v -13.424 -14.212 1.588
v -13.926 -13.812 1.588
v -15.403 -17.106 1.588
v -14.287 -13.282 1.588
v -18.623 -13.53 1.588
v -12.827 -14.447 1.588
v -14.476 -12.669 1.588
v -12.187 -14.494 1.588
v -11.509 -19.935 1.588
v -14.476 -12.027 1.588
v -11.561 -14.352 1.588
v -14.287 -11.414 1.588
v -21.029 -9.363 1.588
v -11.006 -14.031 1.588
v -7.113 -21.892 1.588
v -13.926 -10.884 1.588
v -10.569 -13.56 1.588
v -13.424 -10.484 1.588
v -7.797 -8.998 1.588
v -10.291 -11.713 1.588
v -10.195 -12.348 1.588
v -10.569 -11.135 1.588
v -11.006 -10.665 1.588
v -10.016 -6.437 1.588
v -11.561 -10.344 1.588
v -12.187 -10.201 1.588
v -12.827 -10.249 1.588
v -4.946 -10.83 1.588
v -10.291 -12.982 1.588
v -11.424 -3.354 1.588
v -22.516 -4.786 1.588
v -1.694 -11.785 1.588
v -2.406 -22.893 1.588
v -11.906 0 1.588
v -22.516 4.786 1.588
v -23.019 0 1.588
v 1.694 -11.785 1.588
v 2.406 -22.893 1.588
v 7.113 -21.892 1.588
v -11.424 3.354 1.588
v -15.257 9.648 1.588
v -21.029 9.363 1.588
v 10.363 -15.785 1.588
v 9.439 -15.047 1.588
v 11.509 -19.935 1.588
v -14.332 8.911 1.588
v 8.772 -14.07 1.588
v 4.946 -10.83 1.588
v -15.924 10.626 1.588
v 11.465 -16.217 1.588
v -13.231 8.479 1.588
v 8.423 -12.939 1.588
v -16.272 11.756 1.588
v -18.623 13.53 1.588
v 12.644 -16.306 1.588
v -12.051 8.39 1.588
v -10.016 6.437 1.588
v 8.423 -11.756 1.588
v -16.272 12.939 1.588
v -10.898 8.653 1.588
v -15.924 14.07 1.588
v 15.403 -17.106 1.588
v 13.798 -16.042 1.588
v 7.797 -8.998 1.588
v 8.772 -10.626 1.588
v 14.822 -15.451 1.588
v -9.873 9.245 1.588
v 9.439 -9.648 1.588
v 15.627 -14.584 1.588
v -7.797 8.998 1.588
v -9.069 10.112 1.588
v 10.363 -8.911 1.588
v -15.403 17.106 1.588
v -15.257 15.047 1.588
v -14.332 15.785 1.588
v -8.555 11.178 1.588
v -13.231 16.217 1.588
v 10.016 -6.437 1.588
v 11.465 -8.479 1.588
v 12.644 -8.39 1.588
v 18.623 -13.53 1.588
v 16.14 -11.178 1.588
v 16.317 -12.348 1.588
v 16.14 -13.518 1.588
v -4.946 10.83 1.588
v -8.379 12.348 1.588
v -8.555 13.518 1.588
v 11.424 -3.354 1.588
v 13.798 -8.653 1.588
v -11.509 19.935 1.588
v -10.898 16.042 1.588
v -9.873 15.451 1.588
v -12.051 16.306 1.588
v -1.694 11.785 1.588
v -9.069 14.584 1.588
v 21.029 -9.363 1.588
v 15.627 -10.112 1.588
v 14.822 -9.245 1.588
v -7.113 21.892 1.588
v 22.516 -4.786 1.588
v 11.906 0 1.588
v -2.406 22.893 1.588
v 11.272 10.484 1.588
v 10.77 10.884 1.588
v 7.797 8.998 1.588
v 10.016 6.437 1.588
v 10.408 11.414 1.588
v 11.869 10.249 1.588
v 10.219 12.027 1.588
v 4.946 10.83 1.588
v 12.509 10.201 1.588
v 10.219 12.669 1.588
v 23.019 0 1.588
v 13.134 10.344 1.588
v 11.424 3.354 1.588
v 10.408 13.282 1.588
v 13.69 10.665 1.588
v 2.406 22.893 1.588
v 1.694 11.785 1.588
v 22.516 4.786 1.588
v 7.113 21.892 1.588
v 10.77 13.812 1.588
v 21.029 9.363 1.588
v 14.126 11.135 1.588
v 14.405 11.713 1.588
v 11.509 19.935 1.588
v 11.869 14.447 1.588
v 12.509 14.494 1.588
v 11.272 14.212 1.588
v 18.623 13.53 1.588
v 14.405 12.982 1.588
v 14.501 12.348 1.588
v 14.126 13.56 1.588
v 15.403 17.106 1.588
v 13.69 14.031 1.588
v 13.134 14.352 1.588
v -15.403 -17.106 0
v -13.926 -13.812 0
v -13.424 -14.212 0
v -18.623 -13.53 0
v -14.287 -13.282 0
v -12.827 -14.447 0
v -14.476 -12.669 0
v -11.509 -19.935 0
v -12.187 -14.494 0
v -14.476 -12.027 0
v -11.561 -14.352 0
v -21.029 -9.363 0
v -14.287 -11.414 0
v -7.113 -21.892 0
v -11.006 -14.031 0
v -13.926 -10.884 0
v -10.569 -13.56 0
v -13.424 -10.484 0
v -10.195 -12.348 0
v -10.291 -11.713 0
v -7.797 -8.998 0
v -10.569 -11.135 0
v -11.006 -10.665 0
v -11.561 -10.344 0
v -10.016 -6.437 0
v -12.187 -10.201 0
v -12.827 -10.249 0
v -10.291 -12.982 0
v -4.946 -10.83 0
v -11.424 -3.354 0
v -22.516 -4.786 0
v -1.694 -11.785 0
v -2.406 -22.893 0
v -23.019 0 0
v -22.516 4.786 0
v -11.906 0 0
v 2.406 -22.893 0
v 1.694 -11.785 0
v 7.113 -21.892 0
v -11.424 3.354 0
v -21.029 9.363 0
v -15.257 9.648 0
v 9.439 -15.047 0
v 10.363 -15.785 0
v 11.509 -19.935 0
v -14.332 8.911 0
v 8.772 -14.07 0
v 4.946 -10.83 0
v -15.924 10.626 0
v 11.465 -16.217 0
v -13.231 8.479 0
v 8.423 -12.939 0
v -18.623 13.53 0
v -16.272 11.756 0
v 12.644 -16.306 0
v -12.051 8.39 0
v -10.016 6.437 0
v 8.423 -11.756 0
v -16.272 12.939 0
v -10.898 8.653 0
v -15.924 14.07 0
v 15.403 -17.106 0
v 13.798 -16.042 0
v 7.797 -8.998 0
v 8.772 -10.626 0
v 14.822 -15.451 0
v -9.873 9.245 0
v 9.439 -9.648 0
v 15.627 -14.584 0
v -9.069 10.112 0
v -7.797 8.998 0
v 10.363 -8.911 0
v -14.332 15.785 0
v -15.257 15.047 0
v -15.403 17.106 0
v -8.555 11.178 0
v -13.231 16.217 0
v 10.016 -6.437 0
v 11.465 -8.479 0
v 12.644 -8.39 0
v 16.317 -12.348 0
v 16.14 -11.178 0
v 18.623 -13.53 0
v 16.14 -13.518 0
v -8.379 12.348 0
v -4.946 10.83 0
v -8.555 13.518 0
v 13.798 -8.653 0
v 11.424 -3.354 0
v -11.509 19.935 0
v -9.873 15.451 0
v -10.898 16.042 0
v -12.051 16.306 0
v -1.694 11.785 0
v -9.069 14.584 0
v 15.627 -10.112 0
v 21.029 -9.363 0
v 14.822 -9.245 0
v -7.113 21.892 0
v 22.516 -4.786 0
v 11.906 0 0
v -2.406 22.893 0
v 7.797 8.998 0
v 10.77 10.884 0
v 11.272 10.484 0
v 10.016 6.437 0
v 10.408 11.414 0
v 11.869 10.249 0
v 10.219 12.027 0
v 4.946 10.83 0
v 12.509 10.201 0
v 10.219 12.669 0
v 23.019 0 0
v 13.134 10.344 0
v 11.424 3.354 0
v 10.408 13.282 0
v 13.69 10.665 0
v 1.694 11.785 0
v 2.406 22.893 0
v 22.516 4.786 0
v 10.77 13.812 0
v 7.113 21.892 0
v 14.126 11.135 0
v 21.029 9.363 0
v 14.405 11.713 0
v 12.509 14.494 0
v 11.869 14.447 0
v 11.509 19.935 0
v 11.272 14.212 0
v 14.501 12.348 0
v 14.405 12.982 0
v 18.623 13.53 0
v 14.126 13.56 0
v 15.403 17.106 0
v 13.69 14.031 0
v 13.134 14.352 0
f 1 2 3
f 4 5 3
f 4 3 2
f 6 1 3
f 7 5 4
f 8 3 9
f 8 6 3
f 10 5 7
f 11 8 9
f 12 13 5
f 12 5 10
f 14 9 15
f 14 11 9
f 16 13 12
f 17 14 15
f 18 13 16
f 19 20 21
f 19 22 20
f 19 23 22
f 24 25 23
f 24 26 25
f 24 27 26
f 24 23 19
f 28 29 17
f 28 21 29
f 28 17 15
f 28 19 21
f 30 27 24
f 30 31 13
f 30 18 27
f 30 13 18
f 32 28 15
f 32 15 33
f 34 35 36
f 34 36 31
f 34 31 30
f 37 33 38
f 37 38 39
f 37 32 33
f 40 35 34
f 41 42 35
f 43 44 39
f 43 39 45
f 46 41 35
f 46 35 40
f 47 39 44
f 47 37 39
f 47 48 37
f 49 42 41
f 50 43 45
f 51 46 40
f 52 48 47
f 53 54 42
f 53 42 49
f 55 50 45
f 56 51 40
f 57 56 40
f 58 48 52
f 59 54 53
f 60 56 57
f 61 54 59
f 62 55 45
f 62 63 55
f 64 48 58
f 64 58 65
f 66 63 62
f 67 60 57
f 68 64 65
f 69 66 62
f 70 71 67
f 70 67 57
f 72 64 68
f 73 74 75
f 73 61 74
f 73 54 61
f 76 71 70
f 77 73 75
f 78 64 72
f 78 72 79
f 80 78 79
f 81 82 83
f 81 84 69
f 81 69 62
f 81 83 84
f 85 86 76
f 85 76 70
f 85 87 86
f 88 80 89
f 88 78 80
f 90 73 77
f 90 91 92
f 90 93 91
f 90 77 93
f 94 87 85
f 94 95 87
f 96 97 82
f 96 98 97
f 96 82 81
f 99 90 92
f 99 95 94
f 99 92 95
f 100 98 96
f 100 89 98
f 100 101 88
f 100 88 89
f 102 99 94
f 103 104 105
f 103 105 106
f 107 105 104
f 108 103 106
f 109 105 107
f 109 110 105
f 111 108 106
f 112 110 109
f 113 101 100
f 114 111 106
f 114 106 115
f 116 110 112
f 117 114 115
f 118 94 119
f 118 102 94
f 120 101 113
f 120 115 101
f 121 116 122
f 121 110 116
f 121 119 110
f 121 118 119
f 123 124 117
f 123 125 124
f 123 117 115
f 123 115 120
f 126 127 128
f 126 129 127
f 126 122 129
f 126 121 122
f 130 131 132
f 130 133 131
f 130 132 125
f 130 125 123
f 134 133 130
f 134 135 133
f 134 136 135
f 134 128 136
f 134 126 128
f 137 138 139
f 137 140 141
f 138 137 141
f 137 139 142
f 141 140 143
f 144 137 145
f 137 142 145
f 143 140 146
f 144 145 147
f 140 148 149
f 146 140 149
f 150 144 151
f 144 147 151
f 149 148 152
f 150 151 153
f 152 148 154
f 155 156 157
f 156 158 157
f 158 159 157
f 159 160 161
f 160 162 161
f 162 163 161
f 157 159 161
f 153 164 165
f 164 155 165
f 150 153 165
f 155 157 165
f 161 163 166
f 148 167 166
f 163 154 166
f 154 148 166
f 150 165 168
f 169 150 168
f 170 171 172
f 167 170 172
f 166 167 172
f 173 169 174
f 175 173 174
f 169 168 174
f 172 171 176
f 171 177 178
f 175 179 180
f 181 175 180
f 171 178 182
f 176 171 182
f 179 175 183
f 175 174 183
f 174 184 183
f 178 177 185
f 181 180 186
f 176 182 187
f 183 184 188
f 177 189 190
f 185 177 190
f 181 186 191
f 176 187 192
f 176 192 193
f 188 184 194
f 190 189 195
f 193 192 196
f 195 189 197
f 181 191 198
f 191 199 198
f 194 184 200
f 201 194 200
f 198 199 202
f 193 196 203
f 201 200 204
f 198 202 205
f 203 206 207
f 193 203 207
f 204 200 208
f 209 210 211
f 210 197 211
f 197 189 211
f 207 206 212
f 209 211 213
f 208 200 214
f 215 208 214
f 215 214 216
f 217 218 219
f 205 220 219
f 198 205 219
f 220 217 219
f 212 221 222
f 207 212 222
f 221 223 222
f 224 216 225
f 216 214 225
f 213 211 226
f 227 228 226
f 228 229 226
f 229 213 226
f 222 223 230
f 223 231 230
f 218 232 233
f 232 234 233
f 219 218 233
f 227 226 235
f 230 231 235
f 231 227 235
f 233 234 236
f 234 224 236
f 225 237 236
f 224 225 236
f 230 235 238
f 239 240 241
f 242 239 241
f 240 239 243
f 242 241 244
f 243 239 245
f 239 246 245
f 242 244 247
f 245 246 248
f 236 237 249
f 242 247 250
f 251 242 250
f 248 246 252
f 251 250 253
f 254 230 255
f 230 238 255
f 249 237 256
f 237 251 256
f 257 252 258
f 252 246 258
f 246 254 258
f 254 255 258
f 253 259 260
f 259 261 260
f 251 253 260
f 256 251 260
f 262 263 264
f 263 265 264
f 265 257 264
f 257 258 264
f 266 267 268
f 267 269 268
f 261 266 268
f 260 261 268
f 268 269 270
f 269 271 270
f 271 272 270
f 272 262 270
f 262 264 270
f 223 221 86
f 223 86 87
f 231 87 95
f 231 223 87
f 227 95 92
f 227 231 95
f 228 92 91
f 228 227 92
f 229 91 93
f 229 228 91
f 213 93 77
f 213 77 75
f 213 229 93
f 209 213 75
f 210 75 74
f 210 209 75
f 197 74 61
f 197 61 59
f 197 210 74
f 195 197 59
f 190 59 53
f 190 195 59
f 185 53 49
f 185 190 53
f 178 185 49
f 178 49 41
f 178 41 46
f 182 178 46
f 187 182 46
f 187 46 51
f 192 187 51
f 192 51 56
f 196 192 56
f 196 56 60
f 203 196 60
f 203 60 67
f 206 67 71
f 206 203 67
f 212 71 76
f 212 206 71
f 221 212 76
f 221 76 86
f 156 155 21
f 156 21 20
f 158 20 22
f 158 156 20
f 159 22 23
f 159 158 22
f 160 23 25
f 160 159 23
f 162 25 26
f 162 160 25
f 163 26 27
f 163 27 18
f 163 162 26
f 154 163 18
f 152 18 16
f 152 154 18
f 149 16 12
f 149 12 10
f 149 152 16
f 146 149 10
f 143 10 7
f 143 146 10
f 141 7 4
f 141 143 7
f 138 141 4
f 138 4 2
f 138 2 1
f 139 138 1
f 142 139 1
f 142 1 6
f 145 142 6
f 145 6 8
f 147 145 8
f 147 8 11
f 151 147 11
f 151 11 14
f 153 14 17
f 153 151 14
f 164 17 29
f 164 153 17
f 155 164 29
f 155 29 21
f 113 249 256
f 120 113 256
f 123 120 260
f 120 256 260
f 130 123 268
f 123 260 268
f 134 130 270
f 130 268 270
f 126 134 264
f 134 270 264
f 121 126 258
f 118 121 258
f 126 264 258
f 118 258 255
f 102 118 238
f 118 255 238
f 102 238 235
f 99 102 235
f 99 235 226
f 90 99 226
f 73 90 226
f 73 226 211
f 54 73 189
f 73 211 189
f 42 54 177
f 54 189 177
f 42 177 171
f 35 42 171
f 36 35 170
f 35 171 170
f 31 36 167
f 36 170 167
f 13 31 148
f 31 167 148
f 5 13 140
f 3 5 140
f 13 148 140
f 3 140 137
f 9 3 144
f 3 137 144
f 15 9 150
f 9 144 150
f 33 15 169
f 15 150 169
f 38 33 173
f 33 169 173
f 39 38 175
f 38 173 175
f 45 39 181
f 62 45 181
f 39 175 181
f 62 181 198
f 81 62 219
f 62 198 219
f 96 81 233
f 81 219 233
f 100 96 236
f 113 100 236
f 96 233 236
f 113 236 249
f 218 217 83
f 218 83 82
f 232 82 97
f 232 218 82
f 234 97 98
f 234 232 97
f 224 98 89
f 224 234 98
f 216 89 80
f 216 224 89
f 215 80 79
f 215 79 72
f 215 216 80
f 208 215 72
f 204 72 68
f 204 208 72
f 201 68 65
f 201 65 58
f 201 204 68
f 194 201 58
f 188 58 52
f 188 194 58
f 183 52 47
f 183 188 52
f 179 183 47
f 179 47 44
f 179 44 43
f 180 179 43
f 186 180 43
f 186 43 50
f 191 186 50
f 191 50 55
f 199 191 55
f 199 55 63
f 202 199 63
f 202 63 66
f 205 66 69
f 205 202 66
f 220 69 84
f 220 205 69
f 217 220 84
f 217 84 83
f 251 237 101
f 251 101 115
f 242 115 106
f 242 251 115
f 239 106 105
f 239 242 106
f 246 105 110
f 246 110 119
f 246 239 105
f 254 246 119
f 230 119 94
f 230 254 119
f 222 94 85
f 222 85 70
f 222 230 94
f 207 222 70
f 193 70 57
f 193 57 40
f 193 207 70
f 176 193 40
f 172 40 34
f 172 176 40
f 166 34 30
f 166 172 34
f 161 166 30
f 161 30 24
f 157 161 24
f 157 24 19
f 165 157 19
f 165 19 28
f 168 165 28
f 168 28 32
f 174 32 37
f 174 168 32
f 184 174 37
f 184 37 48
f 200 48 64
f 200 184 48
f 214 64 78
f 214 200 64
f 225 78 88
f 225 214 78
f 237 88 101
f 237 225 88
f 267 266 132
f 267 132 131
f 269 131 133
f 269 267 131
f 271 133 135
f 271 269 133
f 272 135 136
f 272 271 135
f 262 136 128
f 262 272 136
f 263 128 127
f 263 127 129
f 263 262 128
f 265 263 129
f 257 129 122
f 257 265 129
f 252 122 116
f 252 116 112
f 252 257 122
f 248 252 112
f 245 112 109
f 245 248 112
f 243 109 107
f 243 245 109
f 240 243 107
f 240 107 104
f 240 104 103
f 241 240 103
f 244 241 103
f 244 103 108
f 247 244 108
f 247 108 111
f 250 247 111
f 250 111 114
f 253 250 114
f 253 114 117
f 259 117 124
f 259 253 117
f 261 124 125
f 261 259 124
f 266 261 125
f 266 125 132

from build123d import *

# Parameters (mm, degrees)
F0_R     = 23.01875
F0_R_2   = 2.15265
F0_R_3   = 3.96875
F0_R_4   = 11.90625
F1_DEPTH = 1.5875


with BuildPart() as f1:
    # F0 (on Top) → F1 (new body)
    with BuildSketch(Plane.XY):
        Circle(F0_R)
        with Locations((-12.347852, -12.347852)):
            Circle(F0_R_2, mode=Mode.SUBTRACT)
        with Locations((12.347852, -12.347852)):
            Circle(F0_R_3, mode=Mode.SUBTRACT)
        with Locations((-12.347852, 12.347852)):
            Circle(F0_R_3, mode=Mode.SUBTRACT)
        Circle(F0_R_4, mode=Mode.SUBTRACT)
        with Locations((12.347852, 12.347852)):
            Circle(F0_R_2, mode=Mode.SUBTRACT)
    extrude(amount=F1_DEPTH)


solid = f1.part
